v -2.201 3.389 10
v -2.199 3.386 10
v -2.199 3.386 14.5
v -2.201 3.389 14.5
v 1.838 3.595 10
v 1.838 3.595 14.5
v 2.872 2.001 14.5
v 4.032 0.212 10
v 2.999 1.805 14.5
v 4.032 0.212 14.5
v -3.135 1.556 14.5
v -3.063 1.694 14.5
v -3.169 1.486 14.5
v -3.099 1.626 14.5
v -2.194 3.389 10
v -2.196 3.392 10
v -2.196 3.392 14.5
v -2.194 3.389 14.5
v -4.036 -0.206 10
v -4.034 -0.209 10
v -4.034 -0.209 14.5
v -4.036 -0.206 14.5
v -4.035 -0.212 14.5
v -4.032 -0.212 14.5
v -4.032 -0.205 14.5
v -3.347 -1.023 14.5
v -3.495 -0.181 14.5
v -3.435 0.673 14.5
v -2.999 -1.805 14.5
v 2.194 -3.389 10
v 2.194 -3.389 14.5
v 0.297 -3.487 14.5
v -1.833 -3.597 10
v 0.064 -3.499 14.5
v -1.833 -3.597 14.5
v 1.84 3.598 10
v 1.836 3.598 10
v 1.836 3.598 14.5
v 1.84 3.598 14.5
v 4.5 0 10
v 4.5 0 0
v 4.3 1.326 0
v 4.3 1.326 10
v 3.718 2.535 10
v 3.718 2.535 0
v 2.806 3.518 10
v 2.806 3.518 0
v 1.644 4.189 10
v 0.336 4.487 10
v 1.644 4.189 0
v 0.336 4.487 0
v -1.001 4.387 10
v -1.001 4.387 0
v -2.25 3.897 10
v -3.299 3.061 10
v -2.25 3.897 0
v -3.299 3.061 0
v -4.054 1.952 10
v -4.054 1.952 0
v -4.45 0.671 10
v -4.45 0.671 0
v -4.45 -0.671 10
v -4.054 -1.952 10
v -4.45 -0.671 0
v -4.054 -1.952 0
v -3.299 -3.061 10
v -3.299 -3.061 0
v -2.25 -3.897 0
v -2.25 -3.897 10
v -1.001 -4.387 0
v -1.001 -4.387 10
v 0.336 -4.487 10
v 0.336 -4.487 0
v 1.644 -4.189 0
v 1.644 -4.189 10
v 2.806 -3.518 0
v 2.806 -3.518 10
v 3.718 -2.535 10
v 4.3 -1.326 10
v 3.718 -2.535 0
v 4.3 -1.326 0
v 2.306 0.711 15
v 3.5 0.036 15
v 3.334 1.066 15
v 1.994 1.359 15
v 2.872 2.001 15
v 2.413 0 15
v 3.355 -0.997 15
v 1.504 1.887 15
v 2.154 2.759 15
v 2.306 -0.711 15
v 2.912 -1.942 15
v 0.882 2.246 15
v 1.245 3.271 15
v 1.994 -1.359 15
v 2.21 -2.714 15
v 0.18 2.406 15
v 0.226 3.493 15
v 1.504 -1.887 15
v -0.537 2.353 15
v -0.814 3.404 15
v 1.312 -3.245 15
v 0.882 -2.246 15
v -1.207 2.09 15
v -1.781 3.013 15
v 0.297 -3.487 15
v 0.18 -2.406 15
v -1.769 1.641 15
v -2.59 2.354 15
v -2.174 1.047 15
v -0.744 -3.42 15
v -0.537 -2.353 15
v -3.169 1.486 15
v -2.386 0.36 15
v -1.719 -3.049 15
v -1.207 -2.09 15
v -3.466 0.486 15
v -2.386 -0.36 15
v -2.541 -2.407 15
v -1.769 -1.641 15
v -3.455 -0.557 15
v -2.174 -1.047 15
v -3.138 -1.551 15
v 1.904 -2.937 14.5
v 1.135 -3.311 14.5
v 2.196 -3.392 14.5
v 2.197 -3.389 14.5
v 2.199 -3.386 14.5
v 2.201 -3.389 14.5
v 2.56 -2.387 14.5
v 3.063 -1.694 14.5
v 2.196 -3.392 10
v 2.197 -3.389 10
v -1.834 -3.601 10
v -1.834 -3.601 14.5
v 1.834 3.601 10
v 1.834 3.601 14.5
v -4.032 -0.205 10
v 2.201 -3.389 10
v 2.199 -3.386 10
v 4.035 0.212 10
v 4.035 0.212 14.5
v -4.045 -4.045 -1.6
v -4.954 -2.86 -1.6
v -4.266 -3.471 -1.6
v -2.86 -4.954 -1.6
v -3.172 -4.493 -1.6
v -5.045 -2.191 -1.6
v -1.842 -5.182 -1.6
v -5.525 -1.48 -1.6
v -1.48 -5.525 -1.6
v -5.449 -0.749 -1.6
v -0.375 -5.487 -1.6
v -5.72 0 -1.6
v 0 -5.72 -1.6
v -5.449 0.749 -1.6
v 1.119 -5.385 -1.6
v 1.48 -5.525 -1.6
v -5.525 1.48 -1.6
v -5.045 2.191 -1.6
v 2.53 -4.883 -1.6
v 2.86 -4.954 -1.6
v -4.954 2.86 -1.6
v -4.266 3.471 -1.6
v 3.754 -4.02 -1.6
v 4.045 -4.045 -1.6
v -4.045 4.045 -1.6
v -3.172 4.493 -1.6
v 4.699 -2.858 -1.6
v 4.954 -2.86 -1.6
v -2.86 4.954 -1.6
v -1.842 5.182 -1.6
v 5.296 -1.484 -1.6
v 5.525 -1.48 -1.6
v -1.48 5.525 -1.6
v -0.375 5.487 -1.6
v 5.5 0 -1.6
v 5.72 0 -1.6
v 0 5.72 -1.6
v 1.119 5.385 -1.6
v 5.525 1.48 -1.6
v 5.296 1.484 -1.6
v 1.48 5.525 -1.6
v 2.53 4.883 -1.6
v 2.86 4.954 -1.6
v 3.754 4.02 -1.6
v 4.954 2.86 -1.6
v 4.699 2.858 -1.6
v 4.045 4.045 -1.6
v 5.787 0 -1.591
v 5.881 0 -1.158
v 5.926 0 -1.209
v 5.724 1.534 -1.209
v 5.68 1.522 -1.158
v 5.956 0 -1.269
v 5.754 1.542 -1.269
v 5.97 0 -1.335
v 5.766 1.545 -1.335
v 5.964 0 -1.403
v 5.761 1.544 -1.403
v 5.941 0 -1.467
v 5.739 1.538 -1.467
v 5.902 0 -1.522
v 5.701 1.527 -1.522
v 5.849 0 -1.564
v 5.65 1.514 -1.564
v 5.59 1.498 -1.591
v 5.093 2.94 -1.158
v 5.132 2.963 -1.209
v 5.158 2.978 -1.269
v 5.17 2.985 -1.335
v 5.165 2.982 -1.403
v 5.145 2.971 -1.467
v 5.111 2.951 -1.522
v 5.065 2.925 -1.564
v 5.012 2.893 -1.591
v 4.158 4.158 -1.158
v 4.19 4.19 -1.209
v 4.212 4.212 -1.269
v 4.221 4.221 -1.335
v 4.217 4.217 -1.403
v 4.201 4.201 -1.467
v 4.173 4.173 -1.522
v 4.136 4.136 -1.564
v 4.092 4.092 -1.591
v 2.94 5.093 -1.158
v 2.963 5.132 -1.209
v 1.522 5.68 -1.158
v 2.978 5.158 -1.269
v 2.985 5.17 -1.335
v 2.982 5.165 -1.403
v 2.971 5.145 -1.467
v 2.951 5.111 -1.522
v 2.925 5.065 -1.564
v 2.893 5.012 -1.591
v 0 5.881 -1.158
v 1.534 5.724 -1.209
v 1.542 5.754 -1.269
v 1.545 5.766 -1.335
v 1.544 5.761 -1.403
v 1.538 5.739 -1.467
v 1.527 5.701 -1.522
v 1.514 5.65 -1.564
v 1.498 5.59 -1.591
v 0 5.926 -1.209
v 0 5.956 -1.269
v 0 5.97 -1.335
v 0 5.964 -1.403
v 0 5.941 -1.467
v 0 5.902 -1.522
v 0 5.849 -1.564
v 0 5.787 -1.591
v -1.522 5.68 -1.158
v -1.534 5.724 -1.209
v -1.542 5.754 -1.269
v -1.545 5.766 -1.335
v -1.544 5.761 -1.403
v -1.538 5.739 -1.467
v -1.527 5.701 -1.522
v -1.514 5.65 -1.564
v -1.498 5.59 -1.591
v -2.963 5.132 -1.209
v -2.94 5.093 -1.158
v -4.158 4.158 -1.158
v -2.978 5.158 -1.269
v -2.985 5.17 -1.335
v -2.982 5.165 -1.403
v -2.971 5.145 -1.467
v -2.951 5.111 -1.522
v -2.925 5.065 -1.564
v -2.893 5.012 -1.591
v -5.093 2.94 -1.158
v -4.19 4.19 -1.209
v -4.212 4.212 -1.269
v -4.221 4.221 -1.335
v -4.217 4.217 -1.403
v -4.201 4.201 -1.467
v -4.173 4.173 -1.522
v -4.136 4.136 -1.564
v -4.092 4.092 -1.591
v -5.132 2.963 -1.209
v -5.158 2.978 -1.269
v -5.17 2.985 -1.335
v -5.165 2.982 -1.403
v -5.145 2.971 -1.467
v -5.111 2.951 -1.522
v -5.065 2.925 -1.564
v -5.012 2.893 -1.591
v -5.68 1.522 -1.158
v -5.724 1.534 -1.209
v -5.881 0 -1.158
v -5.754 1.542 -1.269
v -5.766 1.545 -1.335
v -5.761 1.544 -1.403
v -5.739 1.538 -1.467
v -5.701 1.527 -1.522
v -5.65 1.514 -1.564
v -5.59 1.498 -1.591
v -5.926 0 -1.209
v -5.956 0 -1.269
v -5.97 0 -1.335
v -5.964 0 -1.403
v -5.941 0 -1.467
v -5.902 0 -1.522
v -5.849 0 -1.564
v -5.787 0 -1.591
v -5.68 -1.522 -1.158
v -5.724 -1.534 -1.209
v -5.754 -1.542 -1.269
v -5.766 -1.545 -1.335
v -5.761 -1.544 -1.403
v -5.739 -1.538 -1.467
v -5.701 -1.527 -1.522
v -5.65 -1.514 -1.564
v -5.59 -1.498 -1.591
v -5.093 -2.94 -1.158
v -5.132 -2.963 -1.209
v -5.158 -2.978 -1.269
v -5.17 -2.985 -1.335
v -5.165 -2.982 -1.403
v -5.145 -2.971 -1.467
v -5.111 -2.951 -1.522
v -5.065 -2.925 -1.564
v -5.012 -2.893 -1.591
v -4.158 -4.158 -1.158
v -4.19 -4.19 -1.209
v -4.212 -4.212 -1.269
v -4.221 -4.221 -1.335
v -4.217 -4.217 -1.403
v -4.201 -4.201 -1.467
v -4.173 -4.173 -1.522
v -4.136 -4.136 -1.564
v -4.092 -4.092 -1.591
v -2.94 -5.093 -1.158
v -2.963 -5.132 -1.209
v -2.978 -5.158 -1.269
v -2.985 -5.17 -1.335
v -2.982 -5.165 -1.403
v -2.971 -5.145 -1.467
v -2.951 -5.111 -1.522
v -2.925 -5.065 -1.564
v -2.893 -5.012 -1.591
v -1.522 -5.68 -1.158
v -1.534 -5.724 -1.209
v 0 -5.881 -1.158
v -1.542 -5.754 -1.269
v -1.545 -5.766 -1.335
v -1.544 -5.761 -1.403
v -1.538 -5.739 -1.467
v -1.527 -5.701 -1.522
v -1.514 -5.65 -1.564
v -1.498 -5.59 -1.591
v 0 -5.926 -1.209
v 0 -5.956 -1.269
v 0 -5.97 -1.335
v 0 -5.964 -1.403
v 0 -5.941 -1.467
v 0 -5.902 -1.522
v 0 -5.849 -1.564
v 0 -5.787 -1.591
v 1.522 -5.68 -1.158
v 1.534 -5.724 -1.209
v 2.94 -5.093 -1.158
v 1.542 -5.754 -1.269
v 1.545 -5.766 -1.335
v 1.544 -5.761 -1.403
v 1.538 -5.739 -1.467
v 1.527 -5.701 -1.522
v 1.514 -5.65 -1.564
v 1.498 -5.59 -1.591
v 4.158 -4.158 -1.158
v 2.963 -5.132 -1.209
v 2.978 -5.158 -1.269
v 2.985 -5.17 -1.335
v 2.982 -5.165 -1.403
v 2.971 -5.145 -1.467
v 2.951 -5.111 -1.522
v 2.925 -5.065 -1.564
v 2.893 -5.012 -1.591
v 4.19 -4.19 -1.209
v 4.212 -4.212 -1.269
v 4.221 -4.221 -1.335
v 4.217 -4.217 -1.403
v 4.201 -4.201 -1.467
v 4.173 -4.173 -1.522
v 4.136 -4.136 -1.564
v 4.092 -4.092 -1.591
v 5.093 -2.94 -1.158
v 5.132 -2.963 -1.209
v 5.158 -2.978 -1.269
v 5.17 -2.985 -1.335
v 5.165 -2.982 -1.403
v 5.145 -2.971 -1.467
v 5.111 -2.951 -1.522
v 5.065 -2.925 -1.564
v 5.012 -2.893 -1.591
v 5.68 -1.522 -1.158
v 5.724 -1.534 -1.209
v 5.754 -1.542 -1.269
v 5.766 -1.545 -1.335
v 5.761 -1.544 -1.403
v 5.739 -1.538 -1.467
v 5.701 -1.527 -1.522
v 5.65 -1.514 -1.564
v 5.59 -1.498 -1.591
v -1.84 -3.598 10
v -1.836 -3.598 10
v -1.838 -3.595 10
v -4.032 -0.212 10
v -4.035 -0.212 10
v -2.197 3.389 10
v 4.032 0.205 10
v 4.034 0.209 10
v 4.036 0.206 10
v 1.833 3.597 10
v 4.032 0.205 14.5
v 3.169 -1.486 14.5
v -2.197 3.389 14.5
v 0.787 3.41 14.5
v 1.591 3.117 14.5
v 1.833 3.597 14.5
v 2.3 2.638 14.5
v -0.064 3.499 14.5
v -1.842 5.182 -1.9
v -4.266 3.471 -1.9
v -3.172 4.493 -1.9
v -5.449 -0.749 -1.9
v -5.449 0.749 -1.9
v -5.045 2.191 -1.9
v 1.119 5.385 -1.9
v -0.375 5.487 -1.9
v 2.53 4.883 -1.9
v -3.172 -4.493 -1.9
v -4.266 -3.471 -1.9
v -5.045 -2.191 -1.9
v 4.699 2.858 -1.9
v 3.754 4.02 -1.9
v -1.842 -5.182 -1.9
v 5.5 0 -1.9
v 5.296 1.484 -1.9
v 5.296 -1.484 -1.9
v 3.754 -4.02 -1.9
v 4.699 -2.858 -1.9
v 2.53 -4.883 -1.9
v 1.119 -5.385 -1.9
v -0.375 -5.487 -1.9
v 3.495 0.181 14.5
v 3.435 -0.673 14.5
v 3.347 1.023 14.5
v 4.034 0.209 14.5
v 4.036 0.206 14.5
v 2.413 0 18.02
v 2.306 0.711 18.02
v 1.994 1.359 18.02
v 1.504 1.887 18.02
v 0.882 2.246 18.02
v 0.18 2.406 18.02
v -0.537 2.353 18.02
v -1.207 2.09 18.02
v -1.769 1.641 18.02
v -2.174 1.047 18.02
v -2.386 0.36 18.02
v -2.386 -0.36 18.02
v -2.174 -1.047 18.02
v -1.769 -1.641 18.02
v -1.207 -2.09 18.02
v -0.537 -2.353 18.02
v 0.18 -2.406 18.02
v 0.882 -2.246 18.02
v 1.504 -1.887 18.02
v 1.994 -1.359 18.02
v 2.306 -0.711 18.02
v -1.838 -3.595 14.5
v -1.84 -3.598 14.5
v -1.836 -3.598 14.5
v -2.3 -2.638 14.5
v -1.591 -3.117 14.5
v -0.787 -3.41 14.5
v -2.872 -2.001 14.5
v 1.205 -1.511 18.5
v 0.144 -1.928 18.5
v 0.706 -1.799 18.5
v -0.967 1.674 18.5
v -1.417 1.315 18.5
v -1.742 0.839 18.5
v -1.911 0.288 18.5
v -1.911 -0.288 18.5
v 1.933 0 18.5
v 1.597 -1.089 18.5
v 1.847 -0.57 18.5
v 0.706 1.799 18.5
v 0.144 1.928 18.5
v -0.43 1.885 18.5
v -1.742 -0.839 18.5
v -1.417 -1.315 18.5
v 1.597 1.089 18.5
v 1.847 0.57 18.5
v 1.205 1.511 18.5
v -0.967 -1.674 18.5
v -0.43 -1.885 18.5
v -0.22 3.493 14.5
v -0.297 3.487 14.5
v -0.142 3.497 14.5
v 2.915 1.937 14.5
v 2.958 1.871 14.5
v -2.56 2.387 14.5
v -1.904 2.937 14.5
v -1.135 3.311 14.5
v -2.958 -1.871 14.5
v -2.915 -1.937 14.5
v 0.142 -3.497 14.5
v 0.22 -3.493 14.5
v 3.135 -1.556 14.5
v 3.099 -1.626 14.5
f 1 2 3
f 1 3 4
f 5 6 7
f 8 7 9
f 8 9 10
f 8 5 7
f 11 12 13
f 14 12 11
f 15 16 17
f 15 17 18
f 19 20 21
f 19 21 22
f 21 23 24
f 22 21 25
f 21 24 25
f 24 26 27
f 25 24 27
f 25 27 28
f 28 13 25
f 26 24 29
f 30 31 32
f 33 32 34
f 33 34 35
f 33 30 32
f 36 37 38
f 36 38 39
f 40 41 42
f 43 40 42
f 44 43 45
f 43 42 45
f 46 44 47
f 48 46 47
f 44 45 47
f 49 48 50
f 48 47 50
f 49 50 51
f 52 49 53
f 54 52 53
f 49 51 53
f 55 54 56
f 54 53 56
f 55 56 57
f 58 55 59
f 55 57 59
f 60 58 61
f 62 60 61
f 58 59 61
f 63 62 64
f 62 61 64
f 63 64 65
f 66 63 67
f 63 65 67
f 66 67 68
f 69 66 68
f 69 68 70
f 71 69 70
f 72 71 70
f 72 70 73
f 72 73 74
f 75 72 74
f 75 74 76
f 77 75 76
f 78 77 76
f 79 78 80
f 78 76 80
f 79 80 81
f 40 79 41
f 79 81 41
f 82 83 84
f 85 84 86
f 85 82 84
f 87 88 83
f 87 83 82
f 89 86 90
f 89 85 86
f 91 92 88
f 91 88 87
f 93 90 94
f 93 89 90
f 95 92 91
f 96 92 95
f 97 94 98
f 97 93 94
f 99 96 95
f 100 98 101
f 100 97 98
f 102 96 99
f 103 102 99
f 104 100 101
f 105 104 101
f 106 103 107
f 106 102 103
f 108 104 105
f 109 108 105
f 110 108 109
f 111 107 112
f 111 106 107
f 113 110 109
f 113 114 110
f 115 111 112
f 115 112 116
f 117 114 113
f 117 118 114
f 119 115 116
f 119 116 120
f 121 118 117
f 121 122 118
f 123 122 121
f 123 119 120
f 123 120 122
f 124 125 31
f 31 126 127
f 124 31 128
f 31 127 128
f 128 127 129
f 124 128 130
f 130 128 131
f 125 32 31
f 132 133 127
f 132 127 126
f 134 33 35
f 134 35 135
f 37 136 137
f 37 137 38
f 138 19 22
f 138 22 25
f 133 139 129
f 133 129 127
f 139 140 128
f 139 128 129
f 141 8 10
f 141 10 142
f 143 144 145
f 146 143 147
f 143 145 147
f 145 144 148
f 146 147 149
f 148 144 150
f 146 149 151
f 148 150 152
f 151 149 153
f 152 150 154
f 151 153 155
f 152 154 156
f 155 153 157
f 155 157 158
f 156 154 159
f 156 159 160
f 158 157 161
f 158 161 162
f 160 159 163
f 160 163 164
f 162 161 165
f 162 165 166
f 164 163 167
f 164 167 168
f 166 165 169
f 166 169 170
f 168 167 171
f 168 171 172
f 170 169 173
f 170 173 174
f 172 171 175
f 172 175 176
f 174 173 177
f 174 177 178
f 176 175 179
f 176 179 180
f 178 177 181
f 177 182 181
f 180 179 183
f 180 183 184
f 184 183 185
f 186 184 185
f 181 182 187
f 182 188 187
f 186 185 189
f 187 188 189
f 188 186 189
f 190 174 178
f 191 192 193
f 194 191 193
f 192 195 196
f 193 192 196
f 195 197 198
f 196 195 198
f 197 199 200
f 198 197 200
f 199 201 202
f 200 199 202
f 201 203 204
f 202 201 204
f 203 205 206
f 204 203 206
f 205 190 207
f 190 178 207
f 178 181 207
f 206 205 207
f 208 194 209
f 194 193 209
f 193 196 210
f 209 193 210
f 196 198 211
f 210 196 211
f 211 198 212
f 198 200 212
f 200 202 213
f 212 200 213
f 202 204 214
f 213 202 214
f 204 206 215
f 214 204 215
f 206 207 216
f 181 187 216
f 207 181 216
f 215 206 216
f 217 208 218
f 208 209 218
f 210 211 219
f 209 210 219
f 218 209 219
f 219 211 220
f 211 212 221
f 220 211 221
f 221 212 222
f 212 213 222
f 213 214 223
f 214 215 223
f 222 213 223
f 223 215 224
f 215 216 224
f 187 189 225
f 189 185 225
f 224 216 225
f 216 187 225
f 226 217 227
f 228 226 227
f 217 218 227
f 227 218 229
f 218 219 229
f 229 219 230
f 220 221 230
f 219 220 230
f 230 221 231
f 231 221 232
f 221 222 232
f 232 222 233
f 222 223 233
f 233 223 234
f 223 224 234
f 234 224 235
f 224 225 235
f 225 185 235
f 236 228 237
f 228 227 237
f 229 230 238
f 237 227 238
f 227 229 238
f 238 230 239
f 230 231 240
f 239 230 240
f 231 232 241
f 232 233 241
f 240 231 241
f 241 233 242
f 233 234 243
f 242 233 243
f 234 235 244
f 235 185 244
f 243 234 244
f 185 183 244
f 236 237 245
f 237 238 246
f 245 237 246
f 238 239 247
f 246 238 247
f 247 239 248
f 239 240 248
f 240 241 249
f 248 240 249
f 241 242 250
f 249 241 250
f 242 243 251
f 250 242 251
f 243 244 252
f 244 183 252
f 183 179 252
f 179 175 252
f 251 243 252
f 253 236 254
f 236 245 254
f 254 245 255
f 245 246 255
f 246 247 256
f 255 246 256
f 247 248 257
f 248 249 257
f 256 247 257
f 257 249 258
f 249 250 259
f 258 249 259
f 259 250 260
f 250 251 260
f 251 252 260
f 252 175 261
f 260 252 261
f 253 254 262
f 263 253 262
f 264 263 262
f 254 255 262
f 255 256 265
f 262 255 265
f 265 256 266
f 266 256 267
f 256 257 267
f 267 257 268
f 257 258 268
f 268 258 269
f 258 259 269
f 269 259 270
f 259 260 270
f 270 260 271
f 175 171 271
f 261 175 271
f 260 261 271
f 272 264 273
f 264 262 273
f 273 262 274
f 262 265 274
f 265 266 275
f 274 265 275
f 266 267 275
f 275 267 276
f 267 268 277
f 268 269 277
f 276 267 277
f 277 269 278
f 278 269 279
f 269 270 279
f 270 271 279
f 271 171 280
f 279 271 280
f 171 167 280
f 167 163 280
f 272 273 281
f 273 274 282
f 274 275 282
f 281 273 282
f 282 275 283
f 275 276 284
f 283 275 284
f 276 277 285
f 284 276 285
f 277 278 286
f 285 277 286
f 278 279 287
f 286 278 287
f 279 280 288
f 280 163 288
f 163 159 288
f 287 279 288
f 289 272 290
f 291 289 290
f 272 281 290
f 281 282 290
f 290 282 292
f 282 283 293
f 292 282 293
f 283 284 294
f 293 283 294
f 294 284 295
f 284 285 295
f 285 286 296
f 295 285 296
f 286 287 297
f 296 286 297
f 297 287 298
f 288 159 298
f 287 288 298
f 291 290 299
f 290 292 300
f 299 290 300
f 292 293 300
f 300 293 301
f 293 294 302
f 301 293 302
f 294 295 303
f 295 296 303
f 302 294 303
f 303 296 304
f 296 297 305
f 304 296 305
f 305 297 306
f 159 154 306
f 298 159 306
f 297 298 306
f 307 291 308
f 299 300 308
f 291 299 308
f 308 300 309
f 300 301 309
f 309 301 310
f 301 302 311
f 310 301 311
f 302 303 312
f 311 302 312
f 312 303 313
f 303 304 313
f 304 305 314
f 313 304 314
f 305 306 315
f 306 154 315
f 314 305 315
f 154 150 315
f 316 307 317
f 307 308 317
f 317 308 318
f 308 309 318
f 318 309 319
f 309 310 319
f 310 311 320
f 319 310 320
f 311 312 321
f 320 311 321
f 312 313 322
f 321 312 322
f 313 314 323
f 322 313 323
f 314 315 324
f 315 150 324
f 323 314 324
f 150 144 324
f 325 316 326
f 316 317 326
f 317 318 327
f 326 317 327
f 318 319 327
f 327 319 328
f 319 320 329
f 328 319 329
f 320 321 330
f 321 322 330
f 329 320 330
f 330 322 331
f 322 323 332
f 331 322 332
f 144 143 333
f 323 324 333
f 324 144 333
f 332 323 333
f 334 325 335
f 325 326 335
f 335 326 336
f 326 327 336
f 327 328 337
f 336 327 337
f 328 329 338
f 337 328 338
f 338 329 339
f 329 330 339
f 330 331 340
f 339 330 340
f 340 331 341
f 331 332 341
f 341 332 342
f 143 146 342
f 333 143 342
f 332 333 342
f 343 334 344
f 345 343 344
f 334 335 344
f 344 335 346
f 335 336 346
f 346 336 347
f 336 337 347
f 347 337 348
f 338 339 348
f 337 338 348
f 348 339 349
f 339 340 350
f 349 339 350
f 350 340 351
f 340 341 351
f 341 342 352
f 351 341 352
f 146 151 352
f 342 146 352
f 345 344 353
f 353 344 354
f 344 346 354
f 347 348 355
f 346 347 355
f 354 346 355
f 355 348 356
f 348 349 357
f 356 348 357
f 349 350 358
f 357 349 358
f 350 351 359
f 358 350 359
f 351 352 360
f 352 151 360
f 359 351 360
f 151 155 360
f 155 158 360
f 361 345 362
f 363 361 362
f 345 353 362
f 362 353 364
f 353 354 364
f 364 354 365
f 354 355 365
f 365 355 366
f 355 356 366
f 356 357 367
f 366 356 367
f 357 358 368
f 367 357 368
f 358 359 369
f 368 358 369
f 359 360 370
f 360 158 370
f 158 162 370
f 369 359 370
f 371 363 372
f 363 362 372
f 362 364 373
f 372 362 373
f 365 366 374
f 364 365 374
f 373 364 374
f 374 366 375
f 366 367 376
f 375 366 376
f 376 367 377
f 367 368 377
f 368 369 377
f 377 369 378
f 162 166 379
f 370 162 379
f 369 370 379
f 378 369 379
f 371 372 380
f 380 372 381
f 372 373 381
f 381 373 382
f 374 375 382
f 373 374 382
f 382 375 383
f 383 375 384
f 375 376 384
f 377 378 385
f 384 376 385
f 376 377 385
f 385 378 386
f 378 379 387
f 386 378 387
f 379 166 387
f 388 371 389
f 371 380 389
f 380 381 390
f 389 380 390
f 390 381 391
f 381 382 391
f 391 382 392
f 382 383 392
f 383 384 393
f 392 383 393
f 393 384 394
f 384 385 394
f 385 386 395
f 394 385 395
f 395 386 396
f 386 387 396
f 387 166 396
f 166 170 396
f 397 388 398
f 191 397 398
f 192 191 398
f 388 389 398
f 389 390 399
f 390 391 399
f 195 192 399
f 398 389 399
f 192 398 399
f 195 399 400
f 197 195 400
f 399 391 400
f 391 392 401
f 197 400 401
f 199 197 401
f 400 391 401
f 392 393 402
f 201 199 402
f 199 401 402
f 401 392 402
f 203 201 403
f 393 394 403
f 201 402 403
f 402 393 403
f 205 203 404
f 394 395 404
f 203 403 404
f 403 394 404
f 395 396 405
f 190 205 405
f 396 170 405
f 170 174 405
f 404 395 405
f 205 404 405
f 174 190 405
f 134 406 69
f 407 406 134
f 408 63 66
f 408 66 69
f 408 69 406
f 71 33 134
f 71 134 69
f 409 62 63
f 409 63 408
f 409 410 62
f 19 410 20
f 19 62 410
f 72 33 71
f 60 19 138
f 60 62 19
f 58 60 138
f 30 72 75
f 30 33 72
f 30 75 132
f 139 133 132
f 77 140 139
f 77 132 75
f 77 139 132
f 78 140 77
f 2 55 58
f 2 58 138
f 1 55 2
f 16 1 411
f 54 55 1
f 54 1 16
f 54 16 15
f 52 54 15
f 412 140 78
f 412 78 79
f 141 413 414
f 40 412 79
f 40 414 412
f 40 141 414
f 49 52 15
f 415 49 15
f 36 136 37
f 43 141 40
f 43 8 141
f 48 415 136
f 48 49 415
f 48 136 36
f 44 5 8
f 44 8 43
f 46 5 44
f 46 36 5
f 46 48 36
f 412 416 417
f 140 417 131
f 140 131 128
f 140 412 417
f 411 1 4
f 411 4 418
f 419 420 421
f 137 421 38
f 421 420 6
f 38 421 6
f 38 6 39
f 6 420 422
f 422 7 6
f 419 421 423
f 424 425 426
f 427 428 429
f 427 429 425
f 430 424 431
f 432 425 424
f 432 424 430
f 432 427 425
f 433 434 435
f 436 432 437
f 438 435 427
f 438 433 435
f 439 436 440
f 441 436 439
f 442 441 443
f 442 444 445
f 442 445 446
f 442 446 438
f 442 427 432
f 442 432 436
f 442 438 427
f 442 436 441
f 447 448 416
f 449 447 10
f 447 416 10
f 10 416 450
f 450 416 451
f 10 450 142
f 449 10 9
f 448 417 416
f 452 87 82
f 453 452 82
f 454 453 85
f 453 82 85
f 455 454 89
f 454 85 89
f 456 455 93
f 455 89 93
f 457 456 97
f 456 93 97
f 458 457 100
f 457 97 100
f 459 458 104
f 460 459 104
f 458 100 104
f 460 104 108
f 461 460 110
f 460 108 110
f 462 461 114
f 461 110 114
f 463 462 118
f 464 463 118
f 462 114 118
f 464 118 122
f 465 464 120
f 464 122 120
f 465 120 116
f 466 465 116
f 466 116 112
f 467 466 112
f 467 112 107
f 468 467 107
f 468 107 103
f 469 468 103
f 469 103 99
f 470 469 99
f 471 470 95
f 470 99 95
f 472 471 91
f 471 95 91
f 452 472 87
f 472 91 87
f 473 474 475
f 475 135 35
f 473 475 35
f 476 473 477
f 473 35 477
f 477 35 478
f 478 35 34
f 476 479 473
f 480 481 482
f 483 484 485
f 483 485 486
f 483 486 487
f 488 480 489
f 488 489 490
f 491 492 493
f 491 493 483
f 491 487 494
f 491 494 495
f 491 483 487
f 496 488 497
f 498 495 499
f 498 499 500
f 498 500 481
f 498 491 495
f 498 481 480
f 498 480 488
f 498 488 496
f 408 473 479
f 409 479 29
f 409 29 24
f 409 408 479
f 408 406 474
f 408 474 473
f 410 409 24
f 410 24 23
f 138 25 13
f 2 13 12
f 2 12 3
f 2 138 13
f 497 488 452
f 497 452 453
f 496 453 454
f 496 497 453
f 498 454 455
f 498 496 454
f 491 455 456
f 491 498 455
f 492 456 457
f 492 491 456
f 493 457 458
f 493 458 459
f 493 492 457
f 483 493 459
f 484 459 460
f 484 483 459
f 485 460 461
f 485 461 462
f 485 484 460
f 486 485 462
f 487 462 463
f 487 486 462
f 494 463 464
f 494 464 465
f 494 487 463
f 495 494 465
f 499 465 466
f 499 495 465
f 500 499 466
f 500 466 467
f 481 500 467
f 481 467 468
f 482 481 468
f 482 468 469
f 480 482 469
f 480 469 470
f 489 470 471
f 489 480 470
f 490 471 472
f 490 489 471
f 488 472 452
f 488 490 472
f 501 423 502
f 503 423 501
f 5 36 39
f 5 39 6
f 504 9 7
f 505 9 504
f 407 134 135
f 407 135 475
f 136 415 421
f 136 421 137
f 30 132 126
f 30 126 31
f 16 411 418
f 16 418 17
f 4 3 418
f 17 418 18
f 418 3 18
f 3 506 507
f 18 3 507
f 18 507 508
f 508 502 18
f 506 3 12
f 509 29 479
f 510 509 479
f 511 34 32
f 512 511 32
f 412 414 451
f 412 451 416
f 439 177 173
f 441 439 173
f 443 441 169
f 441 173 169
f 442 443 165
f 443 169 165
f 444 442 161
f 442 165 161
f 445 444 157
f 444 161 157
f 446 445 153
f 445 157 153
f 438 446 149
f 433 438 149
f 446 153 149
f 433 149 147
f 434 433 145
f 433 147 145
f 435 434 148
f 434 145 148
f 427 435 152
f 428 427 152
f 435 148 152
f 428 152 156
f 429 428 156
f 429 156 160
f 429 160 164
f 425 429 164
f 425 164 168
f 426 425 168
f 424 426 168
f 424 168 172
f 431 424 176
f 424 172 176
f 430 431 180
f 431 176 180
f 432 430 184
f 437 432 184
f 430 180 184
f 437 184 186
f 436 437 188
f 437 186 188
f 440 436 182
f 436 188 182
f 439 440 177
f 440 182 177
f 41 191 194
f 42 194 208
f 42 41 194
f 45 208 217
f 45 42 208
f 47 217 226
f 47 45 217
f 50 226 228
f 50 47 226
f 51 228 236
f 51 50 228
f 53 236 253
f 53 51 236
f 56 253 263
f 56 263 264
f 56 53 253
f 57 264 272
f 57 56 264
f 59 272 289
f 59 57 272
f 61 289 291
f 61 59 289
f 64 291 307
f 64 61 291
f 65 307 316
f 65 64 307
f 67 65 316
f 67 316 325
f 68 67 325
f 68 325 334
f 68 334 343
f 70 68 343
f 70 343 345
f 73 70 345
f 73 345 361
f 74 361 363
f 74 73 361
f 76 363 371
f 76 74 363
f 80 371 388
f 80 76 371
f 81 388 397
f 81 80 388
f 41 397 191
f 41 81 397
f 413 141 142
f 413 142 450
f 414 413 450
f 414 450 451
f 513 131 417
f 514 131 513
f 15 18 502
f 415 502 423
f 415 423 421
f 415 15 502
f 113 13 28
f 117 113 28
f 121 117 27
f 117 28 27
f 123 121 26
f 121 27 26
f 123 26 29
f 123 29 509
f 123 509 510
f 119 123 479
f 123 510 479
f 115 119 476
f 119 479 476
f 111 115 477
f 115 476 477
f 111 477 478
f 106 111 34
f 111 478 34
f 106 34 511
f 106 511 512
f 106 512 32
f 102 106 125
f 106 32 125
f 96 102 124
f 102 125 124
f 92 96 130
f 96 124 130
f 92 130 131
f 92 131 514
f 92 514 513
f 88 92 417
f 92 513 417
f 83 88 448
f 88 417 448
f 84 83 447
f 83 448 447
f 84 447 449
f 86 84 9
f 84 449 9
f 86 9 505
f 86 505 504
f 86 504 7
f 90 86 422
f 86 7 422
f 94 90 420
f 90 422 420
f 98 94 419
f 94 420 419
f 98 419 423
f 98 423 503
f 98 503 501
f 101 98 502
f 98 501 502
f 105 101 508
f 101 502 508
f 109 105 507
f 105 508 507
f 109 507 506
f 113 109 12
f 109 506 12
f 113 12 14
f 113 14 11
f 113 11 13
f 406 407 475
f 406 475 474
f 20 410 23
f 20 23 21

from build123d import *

# Parameters (mm, degrees)
SKETCH_1_R               = 4.5
EXTRUDE_1_DEPTH          = 10
SKETCH_1_2_R             = 4.5
EXTRUDE_2_DEPTH          = 1.6
EXTRUDE_2_DRAFT          = 50
FILLET_1_R               = 0.25
SKETCH_5_R               = 5.5
EXTRUDE_3_DEPTH          = 0.3
EXTRUDE_4_DEPTH          = 4.5
PATTERN_CIRCULAR_1_COUNT = 6
SKETCH_8_R               = 3.5
EXTRUDE_5_DEPTH          = 0.5
SKETCH_9_R               = 2.413
EXTRUDE_6_DEPTH          = 3.5
CHAMFER_1_SIZE           = 0.48


with BuildPart() as part:
    # 스케치1 → 보스-돌출1 (new body)
    with BuildSketch(Plane.XY):
        Circle(SKETCH_1_R)
    extrude(amount=EXTRUDE_1_DEPTH)


with BuildPart() as extrude_2_tool:
    # 스케치1<2> → 보스-돌출2 (with draft: the straight prism first)
    with BuildSketch(Plane.XY):
        Circle(SKETCH_1_2_R)
    extrude(amount=-EXTRUDE_2_DEPTH)
    # 보스-돌출2: the draft: its side faces are tilted about the plane it starts from
    extrude_2_sides = [extrude_2_tool.faces().sort_by_distance(p)[0] for p in [
        (-4.5, 0, -0.8),
    ]]
    draft(extrude_2_sides, Plane.XY, EXTRUDE_2_DRAFT)


with BuildPart() as part_1:
    add(part.part)

    # 보스-돌출2: add extrude_2_tool
    add(extrude_2_tool.part)

    # 필렛1
    fillet_1_edges = [part_1.edges().sort_by_distance(p)[0] for p in [
        (-6.406805748, 0, -1.6),
    ]]
    fillet(fillet_1_edges, radius=FILLET_1_R)

    # 스케치5 → 보스-돌출3 (add)
    with BuildSketch(Plane(origin=(0, 0, -1.6), x_dir=(-1, 0, 0), z_dir=(0, 0, -1))):
        Circle(SKETCH_5_R)
    extrude(amount=EXTRUDE_3_DEPTH)

    # 스케치7 → 보스-돌출4 (add)
    with BuildSketch(Plane.XY.offset(10)):
        Polygon((0, 0), (-2.201088416, 3.388936527), (1.839911584, 3.597833565), align=None)
    extrude_4 = extrude(amount=EXTRUDE_4_DEPTH)

    # 원형 패턴1: 보스-돌출4 ×6 about axis
    pattern_circular_1_axis = Axis((0, 0, 10), (0, 0, 1))
    for i in range(1, PATTERN_CIRCULAR_1_COUNT):
        add(extrude_4.rotate(pattern_circular_1_axis, i * 360 / PATTERN_CIRCULAR_1_COUNT))

    # 스케치8 → 보스-돌출5 (add)
    with BuildSketch(Plane.XY.offset(14.5)):
        Circle(SKETCH_8_R)
    extrude(amount=EXTRUDE_5_DEPTH)

    # 스케치9 → 보스-돌출6 (add)
    with BuildSketch(Plane.XY.offset(15)):
        Circle(SKETCH_9_R)
    extrude(amount=EXTRUDE_6_DEPTH)

    # 모따기1
    chamfer_1_edges = [part_1.edges().sort_by_distance(p)[0] for p in [
        (-2.413, 0, 18.5),
    ]]
    chamfer(chamfer_1_edges, length=CHAMFER_1_SIZE)


solid = part_1.part
